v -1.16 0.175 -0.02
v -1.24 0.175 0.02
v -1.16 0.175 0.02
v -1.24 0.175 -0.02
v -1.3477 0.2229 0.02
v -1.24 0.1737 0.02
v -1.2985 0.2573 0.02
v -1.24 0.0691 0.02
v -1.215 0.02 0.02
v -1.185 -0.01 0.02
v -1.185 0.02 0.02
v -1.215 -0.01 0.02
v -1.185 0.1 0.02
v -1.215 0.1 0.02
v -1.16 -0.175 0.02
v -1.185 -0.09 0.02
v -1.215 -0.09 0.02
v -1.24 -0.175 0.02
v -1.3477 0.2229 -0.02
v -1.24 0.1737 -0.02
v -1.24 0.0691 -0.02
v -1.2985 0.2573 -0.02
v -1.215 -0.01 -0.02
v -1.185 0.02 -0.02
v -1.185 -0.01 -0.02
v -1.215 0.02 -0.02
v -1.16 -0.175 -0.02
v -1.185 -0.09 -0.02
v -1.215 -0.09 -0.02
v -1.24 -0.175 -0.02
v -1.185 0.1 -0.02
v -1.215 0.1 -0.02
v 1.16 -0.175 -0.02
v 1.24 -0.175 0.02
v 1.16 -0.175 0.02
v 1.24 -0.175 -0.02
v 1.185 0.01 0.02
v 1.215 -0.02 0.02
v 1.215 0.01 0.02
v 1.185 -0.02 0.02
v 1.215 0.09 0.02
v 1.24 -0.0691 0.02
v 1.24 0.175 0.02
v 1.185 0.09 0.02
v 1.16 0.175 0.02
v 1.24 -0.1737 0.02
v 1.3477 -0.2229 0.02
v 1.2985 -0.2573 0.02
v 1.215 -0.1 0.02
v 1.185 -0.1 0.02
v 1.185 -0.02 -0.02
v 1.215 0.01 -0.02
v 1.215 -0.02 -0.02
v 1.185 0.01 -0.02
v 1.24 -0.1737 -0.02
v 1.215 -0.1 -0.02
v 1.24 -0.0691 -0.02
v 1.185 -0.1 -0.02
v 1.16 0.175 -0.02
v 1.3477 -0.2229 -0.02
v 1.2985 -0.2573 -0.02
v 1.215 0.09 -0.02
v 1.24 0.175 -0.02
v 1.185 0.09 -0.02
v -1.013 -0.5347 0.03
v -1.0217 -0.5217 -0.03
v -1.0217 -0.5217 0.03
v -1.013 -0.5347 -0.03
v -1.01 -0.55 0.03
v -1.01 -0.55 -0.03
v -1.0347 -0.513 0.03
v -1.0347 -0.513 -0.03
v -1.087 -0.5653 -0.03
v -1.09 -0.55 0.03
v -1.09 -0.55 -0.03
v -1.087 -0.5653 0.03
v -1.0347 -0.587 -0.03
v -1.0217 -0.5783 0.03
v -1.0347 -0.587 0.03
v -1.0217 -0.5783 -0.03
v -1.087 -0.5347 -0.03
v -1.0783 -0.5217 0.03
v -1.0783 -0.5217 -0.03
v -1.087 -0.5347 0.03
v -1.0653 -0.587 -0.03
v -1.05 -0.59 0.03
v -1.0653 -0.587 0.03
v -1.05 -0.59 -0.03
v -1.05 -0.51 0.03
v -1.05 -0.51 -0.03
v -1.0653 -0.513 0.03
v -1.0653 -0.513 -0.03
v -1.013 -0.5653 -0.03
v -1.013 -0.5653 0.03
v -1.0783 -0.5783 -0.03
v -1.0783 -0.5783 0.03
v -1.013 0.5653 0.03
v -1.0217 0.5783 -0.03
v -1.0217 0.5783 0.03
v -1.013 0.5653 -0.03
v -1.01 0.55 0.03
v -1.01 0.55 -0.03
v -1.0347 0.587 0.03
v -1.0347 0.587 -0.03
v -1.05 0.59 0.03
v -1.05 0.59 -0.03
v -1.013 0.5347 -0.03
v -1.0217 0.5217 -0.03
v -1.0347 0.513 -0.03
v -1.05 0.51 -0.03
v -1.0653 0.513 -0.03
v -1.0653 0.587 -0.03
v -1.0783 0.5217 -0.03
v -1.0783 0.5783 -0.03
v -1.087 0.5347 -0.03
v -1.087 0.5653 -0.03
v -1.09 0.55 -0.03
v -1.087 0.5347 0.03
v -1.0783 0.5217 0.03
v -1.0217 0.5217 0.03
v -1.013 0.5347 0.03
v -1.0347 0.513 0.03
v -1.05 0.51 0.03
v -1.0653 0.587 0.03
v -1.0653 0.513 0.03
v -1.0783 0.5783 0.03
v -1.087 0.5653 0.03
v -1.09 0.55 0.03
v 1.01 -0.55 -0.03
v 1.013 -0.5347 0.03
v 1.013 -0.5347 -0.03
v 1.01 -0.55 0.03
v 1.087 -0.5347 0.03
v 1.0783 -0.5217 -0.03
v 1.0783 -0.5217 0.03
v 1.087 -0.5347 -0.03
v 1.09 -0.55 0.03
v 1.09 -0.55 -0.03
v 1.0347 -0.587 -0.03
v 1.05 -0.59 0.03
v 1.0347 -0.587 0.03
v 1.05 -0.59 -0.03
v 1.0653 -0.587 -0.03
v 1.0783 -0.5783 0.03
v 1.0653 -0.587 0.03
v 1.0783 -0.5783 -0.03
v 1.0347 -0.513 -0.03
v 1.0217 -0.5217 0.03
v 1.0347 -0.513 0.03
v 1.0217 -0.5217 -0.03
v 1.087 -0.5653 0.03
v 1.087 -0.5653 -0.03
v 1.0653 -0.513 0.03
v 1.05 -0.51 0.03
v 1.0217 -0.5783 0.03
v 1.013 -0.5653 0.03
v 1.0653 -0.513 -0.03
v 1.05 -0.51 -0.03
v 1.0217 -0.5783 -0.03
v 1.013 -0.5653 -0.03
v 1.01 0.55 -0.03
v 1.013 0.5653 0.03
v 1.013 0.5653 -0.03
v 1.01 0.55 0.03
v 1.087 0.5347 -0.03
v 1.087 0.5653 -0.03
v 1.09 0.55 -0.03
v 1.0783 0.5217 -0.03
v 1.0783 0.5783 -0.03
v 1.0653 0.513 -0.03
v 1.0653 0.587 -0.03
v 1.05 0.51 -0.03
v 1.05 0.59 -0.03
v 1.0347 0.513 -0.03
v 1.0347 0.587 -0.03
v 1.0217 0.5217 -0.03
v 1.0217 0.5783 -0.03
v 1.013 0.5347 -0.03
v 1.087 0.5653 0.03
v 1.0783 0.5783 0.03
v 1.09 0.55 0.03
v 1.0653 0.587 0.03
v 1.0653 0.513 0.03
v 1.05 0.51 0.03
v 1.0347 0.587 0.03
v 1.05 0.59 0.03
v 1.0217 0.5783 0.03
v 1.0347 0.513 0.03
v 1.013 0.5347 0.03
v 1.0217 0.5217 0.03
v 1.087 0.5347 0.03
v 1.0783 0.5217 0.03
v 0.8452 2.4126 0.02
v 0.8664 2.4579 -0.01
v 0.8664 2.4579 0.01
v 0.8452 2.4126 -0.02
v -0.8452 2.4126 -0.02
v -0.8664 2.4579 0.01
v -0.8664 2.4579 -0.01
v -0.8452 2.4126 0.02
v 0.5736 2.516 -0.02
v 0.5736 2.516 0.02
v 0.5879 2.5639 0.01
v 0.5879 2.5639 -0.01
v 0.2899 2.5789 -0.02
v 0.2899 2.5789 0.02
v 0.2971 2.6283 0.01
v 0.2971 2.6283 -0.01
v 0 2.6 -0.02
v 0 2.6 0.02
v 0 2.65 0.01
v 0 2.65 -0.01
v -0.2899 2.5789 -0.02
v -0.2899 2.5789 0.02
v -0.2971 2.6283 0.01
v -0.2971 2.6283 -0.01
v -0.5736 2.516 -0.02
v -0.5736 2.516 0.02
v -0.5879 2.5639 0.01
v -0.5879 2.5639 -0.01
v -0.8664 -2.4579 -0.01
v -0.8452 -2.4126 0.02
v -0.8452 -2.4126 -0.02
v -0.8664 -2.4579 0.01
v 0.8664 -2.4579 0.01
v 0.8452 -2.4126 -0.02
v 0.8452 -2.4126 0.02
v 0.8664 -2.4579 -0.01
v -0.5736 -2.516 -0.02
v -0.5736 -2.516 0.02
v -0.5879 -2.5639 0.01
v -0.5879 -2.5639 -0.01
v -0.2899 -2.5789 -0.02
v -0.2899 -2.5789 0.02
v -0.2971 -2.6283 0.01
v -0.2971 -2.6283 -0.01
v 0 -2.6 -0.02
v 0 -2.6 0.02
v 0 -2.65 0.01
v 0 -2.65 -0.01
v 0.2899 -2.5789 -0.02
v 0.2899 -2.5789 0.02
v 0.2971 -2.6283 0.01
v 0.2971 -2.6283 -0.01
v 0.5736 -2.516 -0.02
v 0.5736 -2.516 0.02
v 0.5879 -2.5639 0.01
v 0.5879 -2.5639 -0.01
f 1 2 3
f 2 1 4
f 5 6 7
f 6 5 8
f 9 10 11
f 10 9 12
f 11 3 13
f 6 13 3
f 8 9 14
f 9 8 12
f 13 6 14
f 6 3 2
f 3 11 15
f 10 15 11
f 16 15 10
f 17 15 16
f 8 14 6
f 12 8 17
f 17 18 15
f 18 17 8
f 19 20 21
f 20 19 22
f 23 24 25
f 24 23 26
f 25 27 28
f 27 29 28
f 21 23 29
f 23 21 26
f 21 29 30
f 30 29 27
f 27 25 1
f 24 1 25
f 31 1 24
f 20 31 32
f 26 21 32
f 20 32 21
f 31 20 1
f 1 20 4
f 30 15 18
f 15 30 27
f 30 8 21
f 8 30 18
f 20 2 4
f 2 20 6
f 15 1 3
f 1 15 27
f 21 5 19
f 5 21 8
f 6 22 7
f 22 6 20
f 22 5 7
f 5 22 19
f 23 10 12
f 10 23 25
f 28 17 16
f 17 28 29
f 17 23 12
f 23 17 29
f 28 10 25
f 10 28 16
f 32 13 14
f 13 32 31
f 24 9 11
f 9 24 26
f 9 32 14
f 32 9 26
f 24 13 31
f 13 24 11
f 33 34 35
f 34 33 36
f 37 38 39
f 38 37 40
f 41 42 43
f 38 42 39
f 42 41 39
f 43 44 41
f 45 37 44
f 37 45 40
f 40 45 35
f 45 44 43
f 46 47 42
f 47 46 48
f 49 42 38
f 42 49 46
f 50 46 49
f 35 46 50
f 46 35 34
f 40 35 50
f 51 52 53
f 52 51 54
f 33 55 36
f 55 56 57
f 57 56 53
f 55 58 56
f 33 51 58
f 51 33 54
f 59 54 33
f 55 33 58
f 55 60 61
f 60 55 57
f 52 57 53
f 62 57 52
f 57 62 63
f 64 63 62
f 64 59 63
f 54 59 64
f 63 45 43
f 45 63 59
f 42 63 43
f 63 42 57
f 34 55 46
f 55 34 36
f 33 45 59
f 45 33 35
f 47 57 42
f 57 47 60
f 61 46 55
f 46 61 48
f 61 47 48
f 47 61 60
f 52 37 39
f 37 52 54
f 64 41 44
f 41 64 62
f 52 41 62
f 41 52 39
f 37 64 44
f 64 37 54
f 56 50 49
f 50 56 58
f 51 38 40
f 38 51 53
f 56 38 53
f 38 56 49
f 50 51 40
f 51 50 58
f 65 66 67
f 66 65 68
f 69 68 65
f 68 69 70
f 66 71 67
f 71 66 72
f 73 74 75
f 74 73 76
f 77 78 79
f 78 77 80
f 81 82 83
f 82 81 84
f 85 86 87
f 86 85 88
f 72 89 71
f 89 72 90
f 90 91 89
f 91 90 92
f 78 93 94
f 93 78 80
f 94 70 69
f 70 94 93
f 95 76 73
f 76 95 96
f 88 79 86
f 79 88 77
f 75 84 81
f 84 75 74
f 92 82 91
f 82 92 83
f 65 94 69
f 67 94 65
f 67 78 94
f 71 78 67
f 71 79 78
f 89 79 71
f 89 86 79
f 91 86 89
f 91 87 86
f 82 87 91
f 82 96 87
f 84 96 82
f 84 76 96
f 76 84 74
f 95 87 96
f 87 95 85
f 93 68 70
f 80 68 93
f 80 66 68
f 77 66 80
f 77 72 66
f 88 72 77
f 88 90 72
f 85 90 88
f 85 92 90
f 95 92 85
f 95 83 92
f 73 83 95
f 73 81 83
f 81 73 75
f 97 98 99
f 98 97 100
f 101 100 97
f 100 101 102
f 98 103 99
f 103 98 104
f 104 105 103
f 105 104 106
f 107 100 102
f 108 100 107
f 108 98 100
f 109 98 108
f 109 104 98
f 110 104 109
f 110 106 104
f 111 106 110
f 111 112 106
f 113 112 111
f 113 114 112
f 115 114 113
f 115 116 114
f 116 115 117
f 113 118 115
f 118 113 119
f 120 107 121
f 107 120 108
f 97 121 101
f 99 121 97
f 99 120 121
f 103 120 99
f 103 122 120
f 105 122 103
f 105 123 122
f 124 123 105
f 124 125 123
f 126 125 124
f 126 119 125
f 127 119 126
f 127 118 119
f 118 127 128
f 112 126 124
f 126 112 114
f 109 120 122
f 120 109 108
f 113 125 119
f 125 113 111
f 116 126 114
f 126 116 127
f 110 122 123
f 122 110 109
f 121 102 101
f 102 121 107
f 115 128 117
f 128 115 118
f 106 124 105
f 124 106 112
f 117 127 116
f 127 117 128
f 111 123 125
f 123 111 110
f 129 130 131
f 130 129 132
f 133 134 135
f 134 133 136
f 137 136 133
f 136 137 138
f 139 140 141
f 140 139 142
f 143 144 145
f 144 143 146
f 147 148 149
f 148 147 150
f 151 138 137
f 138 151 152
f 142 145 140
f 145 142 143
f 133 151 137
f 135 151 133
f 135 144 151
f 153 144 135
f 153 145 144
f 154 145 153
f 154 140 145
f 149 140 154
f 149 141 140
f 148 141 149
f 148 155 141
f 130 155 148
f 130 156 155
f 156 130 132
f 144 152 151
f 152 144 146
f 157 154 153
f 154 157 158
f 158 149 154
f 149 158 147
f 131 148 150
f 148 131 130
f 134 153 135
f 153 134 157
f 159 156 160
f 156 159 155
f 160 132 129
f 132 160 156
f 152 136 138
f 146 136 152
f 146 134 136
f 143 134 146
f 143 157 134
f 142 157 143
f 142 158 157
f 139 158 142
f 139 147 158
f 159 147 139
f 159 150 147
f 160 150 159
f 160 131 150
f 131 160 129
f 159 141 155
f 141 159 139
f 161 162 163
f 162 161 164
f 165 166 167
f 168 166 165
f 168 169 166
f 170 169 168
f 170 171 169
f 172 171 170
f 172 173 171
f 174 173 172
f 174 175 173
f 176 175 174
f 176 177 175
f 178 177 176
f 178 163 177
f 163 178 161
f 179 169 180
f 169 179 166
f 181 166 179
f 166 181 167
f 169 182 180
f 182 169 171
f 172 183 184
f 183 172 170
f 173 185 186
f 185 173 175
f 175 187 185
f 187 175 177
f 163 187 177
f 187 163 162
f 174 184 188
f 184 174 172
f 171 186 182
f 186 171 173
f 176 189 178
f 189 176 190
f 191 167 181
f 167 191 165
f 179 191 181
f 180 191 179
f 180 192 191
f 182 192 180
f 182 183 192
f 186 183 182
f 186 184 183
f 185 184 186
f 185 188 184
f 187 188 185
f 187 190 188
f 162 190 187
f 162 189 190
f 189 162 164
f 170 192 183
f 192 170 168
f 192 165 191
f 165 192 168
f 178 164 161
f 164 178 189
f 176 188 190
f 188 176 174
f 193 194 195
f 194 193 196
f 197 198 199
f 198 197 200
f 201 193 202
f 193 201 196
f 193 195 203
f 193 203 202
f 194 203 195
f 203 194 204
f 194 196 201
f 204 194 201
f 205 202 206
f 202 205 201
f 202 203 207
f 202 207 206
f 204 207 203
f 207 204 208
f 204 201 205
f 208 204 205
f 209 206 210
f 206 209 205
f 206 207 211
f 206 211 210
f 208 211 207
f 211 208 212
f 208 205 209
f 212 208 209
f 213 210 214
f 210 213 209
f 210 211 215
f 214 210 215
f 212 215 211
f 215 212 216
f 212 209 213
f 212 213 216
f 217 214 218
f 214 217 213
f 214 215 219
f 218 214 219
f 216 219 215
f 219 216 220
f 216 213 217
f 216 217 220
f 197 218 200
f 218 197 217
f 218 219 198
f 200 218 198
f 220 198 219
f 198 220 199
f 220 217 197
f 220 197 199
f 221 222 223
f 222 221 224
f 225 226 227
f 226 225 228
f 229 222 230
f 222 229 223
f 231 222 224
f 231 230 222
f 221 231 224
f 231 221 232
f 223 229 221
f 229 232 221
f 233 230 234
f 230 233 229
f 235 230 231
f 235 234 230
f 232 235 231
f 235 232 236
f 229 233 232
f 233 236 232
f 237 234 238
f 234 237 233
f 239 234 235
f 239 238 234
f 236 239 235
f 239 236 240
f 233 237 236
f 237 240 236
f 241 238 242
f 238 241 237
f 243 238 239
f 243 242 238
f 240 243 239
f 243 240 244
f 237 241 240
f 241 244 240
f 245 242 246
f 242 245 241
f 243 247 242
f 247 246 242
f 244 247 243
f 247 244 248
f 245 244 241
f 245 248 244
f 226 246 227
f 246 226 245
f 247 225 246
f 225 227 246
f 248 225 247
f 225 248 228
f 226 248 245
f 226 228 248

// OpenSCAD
// camera_hud_curved_bezel.scad
// Sleek curved floating HUD visor frame with chamfered corner chevrons and sensor notches.
// Designed to anchor into camera-local space for in-scene 3D HUD surfaces.

$fn = 32;

module curved_arc(radius, angle_span, thickness, height) {
    rotate_extrude(angle = angle_span, $fn = 48)
    translate([radius, 0, 0])
    polygon(points = [
        [0, -height/2],
        [thickness, -height/2 + thickness*0.2],
        [thickness, height/2 - thickness*0.2],
        [0, height/2]
    ]);
}

module chevron_wing() {
    difference() {
        union() {
            // Outer wing slab
            cube([0.35, 0.08, 0.04], center = true);
            // Angled tab
            translate([0.15, 0.06, 0])
            rotate([0, 0, 35])
            cube([0.22, 0.06, 0.04], center = true);
        }
        // Telemetry slot cutouts
        translate([-0.05, 0, 0])
        cube([0.08, 0.03, 0.08], center = true);
        translate([0.06, 0, 0])
        cube([0.08, 0.03, 0.08], center = true);
    }
}

module camera_hud_curved_bezel() {
    radius = 2.0;
    span = 50;

    // Top visor arc
    translate([0, 0.6, 0])
    rotate([0, 0, 90 - span/2])
    curved_arc(radius, span, 0.05, 0.04);

    // Bottom chin arc
    translate([0, -0.6, 0])
    rotate([0, 0, 270 - span/2])
    curved_arc(radius, span, 0.05, 0.04);

    // Left chevron wing bracket
    translate([-1.2, 0, 0])
    rotate([0, 0, 90])
    chevron_wing();

    // Right chevron wing bracket
    translate([1.2, 0, 0])
    rotate([0, 0, -90])
    chevron_wing();

    // Sensor boss nodes on corners
    for (sx = [-1, 1]) {
        for (sy = [-1, 1]) {
            translate([sx * 1.05, sy * 0.55, 0])
            cylinder(r = 0.04, h = 0.06, center = true, $fn = 16);
        }
    }
}

camera_hud_curved_bezel();
